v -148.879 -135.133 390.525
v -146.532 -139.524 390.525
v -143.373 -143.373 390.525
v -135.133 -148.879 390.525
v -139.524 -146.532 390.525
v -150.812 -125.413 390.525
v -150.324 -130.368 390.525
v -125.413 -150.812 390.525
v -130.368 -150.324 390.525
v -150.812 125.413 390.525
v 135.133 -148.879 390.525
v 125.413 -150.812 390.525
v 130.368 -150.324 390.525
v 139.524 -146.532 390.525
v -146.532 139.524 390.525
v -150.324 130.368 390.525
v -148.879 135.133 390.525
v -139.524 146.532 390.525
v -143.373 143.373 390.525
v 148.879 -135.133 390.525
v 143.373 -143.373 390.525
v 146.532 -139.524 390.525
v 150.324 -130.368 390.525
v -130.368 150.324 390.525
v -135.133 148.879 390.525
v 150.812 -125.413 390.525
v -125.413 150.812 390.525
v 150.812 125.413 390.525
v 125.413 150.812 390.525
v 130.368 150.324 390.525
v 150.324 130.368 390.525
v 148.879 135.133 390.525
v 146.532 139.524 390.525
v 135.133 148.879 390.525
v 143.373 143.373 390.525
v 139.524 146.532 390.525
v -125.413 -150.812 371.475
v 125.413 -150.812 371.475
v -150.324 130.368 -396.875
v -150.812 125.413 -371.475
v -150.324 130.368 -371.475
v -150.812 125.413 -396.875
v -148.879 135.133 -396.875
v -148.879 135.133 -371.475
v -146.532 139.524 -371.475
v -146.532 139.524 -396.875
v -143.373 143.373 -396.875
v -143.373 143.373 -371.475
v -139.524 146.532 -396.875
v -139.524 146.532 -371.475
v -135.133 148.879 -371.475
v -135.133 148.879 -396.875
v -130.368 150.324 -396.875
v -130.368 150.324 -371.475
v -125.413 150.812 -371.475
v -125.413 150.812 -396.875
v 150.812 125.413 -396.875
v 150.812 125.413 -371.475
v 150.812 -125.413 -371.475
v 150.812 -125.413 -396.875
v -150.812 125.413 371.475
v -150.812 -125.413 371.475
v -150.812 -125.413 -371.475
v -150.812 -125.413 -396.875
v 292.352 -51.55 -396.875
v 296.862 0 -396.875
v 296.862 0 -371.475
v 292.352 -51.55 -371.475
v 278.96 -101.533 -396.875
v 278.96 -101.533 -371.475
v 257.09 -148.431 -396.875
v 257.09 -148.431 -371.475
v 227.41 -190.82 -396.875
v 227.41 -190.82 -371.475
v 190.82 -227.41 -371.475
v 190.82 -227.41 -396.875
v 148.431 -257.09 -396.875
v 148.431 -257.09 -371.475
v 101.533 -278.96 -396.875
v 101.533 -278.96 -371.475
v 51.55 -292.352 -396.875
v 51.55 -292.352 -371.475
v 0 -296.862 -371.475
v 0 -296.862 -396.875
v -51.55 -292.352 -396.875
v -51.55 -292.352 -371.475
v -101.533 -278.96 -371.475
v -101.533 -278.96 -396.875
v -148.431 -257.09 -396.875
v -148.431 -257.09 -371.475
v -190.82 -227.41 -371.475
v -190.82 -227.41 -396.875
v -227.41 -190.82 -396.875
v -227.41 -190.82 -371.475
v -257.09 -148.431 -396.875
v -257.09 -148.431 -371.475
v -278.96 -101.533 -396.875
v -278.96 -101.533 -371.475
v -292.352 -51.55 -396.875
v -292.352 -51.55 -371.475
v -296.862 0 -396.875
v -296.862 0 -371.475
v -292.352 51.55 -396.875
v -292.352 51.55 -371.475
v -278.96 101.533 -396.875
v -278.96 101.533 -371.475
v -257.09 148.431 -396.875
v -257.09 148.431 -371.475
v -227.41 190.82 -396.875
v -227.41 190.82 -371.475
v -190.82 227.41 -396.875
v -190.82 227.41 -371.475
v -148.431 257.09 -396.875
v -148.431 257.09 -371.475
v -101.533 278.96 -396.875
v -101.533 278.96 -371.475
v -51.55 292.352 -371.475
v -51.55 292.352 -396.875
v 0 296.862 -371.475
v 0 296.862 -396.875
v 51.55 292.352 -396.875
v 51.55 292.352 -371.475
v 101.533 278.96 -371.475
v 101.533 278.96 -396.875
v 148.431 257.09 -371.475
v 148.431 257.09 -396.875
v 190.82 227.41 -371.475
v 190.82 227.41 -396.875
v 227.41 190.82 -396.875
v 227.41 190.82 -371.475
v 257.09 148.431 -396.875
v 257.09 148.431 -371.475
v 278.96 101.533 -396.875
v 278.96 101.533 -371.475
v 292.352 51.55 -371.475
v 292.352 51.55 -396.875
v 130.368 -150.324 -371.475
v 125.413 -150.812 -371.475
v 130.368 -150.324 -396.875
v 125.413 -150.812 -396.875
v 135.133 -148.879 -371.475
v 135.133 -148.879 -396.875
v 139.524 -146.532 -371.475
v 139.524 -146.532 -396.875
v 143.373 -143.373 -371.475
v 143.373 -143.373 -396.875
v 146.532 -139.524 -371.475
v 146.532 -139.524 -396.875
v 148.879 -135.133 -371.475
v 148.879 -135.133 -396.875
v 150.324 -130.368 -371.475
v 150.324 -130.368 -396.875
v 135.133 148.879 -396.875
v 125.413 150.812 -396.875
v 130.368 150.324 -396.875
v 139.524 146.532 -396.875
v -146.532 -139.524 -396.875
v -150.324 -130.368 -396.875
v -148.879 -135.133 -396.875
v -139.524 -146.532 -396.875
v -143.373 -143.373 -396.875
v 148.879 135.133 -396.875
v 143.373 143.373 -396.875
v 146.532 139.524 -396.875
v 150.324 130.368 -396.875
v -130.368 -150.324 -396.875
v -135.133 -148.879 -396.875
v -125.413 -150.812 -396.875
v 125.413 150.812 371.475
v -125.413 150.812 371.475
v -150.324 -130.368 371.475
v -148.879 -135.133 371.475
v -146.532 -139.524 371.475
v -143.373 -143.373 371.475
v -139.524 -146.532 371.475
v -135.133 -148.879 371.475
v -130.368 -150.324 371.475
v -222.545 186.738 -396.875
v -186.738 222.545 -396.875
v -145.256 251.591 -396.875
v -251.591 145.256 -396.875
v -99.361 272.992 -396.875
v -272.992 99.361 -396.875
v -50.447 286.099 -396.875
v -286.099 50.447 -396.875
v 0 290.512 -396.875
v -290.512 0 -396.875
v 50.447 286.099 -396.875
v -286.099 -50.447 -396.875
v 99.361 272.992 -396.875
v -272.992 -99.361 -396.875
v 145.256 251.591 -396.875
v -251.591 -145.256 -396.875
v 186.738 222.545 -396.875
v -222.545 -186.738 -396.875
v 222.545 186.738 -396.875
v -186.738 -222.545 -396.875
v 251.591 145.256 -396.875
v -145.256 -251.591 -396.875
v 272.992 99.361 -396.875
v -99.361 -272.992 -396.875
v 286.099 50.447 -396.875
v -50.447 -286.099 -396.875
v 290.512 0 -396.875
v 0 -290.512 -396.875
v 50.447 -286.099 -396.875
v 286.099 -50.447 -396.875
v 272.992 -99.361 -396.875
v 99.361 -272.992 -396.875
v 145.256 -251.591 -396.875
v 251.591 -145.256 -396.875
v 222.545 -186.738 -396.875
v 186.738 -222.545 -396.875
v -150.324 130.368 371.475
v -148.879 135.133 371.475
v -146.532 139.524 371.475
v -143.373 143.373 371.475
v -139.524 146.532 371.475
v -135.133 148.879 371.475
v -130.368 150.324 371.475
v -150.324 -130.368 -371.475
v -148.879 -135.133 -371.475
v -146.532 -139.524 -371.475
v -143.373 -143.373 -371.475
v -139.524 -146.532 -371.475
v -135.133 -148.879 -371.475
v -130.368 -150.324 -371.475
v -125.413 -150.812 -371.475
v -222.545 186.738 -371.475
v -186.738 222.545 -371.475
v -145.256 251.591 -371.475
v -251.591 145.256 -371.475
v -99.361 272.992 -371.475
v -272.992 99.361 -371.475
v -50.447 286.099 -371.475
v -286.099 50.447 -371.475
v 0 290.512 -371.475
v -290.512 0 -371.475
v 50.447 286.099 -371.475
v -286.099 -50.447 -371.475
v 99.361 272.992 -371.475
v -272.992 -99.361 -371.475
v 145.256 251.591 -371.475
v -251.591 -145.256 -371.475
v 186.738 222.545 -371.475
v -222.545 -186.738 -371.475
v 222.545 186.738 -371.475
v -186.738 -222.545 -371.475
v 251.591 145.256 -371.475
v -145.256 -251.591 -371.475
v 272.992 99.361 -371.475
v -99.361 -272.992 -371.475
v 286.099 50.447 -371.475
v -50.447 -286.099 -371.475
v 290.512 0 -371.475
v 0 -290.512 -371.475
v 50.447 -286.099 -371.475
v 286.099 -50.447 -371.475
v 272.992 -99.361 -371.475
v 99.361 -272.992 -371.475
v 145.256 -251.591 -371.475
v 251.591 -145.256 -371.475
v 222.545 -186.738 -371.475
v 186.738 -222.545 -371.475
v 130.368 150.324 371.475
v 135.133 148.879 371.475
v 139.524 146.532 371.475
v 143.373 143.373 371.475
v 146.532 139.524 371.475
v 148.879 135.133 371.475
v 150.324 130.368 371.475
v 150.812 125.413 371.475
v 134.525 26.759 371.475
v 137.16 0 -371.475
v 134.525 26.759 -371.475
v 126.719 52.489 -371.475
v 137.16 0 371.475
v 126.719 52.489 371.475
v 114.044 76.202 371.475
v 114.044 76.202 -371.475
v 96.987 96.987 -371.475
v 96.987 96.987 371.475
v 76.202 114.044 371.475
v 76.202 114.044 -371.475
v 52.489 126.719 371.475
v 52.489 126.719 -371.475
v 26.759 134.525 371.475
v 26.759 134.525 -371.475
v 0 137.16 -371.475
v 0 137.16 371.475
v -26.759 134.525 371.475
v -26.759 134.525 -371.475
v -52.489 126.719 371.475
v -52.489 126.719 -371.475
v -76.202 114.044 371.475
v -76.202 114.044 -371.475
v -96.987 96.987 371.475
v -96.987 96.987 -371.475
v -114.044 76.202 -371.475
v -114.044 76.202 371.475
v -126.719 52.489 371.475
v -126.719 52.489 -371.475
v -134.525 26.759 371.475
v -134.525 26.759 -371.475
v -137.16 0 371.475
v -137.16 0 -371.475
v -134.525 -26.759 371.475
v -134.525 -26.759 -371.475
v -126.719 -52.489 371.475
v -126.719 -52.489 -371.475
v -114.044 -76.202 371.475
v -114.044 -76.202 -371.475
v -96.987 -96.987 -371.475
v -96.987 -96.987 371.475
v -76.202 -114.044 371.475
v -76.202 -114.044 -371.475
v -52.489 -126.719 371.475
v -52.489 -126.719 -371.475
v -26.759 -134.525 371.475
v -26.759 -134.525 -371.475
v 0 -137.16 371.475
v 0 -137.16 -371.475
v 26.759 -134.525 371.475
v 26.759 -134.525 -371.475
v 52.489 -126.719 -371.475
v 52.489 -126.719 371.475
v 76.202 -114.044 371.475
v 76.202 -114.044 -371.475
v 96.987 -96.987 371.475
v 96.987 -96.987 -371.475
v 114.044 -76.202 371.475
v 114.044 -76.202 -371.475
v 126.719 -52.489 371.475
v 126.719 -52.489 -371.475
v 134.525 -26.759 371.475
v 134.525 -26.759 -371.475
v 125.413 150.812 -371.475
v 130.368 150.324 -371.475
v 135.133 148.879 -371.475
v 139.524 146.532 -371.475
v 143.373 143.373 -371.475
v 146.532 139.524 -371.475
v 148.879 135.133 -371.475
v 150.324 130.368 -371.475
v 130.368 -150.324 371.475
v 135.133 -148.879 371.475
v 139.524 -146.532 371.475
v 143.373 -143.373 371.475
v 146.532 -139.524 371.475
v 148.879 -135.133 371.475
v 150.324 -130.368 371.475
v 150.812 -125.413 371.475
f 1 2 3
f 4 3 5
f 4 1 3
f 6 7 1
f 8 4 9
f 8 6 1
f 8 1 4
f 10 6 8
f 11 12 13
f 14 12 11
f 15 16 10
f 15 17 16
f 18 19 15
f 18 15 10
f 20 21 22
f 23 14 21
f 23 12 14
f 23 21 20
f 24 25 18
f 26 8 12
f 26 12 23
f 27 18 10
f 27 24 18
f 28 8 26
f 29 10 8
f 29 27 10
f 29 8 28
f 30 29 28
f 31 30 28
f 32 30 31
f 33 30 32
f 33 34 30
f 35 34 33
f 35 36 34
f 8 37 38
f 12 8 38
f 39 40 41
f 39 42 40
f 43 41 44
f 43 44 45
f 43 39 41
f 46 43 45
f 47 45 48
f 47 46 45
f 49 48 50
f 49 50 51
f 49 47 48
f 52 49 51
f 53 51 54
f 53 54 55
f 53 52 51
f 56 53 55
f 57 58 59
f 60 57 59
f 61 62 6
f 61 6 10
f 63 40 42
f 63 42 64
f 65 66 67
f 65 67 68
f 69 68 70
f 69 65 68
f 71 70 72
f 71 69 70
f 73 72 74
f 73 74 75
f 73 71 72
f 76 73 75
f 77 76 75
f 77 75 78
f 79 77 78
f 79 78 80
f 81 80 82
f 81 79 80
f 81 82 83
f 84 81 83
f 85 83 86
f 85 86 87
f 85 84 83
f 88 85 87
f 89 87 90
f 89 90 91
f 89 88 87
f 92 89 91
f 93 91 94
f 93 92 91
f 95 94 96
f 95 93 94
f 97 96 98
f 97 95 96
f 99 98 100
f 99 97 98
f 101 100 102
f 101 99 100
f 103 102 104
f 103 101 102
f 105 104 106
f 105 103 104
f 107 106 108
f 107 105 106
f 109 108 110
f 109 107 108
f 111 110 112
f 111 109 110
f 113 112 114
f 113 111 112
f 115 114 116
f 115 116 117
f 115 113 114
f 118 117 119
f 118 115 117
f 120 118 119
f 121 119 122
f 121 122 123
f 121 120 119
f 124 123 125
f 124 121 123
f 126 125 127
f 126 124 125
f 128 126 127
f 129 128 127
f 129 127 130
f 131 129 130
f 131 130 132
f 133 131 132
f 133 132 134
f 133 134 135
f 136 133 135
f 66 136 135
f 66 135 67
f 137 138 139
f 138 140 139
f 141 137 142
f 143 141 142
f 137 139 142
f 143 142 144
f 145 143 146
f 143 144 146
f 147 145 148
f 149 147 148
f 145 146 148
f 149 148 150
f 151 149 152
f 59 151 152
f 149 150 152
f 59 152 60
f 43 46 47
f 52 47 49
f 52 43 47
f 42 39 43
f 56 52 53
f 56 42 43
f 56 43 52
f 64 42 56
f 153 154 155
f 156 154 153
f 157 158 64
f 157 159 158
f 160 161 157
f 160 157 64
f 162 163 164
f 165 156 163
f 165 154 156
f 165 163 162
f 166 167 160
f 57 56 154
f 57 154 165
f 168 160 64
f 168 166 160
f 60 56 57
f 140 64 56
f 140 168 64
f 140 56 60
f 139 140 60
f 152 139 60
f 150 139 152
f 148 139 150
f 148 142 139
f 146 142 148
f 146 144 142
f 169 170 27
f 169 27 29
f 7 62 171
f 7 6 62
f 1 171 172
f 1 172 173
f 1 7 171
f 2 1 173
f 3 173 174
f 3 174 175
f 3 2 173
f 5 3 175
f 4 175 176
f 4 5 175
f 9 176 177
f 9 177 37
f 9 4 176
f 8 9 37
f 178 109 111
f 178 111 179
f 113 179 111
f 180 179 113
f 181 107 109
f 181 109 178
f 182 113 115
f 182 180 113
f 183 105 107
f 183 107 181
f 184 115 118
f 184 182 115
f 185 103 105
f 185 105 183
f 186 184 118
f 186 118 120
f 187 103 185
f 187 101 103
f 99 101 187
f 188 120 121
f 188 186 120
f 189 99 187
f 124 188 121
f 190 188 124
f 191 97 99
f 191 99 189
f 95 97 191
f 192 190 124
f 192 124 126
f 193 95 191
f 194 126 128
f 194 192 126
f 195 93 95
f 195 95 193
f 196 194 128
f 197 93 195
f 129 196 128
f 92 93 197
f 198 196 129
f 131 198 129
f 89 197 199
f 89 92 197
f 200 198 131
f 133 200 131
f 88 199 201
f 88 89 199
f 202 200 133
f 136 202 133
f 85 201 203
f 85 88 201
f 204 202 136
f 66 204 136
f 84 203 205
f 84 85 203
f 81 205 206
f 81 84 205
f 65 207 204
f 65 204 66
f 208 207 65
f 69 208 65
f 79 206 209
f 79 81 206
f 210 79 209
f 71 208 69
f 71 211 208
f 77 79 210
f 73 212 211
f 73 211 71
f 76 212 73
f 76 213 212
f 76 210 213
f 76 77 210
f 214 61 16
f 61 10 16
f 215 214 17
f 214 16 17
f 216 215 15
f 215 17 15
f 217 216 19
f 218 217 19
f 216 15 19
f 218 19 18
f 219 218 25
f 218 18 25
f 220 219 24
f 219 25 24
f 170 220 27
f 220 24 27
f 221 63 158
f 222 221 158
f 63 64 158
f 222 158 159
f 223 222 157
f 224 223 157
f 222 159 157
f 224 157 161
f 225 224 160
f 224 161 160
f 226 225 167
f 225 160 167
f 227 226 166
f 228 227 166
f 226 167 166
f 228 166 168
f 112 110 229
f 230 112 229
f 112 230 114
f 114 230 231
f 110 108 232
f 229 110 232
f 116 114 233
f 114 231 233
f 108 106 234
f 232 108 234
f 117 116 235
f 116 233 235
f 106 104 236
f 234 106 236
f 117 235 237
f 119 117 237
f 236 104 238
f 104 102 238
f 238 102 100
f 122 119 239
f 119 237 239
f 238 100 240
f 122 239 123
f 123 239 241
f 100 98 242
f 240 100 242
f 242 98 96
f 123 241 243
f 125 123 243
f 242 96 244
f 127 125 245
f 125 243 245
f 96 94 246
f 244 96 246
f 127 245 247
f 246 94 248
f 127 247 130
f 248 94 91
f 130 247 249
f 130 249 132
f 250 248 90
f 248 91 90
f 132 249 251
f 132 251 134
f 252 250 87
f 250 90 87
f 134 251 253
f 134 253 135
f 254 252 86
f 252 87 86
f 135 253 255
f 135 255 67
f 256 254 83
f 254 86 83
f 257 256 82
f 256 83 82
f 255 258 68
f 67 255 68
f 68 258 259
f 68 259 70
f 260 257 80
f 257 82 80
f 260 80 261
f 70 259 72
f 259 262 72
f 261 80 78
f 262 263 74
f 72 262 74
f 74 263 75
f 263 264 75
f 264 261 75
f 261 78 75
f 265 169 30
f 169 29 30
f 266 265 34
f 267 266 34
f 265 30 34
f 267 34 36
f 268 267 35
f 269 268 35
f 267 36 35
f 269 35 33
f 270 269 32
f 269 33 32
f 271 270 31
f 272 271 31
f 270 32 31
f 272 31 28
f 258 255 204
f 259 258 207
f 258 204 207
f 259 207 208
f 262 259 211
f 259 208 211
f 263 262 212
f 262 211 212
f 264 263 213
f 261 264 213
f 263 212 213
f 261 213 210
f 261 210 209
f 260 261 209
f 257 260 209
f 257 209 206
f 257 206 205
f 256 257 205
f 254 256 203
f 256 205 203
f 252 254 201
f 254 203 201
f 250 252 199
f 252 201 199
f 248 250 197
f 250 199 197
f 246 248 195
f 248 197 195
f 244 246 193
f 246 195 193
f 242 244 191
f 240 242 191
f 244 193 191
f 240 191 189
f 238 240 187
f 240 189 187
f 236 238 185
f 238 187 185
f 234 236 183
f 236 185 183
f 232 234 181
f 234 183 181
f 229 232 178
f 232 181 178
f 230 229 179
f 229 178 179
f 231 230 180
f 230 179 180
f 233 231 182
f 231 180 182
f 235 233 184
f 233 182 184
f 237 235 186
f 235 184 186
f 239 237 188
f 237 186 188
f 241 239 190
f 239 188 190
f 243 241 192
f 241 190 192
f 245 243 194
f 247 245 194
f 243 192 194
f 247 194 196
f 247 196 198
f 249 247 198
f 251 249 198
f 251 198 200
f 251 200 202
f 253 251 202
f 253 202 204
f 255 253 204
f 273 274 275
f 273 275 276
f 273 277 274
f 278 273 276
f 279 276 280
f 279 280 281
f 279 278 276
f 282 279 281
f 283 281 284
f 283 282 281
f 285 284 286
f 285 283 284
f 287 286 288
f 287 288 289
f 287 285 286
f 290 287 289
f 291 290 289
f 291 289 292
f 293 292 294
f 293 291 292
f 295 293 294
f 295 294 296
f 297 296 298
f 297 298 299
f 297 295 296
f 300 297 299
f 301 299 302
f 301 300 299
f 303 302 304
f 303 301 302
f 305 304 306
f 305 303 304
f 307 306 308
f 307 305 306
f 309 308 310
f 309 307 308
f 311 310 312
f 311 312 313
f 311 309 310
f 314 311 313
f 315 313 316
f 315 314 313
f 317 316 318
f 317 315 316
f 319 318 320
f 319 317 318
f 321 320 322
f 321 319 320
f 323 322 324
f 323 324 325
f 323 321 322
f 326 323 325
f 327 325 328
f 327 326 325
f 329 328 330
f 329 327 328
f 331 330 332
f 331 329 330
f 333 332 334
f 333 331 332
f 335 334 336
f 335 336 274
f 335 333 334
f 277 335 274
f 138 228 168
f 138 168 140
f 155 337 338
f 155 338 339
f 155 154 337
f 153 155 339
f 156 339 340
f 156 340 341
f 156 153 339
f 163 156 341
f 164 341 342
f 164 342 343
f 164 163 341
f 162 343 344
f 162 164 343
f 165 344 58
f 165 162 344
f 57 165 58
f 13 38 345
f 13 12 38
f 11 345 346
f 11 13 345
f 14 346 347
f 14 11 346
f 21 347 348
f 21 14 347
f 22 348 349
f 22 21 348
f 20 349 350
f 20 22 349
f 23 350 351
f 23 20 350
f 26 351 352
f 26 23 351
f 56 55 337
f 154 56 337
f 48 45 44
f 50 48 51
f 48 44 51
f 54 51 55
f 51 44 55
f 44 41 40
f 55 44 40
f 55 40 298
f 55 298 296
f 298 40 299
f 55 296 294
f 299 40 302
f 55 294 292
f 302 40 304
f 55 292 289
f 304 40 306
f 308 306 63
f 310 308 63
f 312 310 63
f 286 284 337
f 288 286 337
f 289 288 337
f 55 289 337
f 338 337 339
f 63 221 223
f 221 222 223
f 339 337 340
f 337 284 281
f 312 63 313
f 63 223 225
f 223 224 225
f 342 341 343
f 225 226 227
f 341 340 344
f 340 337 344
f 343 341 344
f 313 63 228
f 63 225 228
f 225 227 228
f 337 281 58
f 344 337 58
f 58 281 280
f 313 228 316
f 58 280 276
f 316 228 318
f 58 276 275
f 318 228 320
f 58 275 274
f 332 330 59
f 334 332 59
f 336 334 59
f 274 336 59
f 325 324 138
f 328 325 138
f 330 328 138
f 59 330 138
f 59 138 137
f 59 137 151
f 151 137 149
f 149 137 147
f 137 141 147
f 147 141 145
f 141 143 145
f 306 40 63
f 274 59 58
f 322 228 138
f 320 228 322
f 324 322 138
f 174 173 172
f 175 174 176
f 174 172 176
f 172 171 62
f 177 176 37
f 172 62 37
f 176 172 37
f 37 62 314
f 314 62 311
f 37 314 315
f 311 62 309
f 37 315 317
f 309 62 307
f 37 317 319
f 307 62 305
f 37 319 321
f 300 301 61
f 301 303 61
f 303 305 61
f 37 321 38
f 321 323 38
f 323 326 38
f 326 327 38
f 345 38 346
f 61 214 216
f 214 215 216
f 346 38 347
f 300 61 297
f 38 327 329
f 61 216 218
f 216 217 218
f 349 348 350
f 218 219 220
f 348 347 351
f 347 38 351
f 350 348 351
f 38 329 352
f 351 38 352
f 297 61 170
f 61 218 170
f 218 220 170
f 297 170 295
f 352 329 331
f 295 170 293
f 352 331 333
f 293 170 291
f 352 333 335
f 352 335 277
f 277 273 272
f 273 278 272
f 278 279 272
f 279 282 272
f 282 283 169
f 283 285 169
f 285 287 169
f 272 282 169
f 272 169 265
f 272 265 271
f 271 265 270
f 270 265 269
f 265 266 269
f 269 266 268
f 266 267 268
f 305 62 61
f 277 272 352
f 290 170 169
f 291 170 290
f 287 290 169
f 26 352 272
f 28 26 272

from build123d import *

# Parameters (mm, degrees)
F0_R     = 137.16
F1_DEPTH = 371.475
F2_W     = 301.625
F2_H     = 301.625
F3_DEPTH = 19.05
F4_W     = 301.625
F4_H     = 301.625
F5_DEPTH = 25.4
F6_R     = 25.4
F7_R     = 296.8625
F7_R_2   = 290.5125
F8_DEPTH = 25.4


with BuildPart() as f1:
    # F0 (on Top) → F1 (new body, symmetric)
    with BuildSketch(Plane.XY):
        Circle(F0_R)
    extrude(amount=F1_DEPTH, both=True)

    # F2 (on face) → F3 (join)
    with BuildSketch(Plane.XY.offset(371.475)):
        Rectangle(F2_W, F2_H)
    extrude(amount=F3_DEPTH)

    # F4 (on face) → F5 (join)
    with BuildSketch(Plane(origin=(0, 0, -371.475), x_dir=(1, 0, 0), z_dir=(0, 0, -1))):
        Rectangle(F4_W, F4_H)
    extrude(amount=F5_DEPTH)

    # F6
    f6_edges = [f1.edges().sort_by_distance(p)[0] for p in [
        (150.8125, -150.8125, -384.175),
        (-150.8125, -150.8125, -384.175),
        (150.8125, 150.8125, -384.175),
        (-150.8125, 150.8125, -384.175),
        (-150.8125, 150.8125, 381),
        (150.8125, 150.8125, 381),
        (-150.8125, -150.8125, 381),
        (150.8125, -150.8125, 381),
    ]]
    fillet(f6_edges, radius=F6_R)


with BuildPart() as f8:
    # F7 (on face) → F8 (new body)
    with BuildSketch(Plane(origin=(0, 0, -396.875), x_dir=(1, 0, 0), z_dir=(0, 0, -1))):
        Circle(F7_R)
        Circle(F7_R_2, mode=Mode.SUBTRACT)
    extrude(amount=-F8_DEPTH)


solid = Compound([f1.part, f8.part])
